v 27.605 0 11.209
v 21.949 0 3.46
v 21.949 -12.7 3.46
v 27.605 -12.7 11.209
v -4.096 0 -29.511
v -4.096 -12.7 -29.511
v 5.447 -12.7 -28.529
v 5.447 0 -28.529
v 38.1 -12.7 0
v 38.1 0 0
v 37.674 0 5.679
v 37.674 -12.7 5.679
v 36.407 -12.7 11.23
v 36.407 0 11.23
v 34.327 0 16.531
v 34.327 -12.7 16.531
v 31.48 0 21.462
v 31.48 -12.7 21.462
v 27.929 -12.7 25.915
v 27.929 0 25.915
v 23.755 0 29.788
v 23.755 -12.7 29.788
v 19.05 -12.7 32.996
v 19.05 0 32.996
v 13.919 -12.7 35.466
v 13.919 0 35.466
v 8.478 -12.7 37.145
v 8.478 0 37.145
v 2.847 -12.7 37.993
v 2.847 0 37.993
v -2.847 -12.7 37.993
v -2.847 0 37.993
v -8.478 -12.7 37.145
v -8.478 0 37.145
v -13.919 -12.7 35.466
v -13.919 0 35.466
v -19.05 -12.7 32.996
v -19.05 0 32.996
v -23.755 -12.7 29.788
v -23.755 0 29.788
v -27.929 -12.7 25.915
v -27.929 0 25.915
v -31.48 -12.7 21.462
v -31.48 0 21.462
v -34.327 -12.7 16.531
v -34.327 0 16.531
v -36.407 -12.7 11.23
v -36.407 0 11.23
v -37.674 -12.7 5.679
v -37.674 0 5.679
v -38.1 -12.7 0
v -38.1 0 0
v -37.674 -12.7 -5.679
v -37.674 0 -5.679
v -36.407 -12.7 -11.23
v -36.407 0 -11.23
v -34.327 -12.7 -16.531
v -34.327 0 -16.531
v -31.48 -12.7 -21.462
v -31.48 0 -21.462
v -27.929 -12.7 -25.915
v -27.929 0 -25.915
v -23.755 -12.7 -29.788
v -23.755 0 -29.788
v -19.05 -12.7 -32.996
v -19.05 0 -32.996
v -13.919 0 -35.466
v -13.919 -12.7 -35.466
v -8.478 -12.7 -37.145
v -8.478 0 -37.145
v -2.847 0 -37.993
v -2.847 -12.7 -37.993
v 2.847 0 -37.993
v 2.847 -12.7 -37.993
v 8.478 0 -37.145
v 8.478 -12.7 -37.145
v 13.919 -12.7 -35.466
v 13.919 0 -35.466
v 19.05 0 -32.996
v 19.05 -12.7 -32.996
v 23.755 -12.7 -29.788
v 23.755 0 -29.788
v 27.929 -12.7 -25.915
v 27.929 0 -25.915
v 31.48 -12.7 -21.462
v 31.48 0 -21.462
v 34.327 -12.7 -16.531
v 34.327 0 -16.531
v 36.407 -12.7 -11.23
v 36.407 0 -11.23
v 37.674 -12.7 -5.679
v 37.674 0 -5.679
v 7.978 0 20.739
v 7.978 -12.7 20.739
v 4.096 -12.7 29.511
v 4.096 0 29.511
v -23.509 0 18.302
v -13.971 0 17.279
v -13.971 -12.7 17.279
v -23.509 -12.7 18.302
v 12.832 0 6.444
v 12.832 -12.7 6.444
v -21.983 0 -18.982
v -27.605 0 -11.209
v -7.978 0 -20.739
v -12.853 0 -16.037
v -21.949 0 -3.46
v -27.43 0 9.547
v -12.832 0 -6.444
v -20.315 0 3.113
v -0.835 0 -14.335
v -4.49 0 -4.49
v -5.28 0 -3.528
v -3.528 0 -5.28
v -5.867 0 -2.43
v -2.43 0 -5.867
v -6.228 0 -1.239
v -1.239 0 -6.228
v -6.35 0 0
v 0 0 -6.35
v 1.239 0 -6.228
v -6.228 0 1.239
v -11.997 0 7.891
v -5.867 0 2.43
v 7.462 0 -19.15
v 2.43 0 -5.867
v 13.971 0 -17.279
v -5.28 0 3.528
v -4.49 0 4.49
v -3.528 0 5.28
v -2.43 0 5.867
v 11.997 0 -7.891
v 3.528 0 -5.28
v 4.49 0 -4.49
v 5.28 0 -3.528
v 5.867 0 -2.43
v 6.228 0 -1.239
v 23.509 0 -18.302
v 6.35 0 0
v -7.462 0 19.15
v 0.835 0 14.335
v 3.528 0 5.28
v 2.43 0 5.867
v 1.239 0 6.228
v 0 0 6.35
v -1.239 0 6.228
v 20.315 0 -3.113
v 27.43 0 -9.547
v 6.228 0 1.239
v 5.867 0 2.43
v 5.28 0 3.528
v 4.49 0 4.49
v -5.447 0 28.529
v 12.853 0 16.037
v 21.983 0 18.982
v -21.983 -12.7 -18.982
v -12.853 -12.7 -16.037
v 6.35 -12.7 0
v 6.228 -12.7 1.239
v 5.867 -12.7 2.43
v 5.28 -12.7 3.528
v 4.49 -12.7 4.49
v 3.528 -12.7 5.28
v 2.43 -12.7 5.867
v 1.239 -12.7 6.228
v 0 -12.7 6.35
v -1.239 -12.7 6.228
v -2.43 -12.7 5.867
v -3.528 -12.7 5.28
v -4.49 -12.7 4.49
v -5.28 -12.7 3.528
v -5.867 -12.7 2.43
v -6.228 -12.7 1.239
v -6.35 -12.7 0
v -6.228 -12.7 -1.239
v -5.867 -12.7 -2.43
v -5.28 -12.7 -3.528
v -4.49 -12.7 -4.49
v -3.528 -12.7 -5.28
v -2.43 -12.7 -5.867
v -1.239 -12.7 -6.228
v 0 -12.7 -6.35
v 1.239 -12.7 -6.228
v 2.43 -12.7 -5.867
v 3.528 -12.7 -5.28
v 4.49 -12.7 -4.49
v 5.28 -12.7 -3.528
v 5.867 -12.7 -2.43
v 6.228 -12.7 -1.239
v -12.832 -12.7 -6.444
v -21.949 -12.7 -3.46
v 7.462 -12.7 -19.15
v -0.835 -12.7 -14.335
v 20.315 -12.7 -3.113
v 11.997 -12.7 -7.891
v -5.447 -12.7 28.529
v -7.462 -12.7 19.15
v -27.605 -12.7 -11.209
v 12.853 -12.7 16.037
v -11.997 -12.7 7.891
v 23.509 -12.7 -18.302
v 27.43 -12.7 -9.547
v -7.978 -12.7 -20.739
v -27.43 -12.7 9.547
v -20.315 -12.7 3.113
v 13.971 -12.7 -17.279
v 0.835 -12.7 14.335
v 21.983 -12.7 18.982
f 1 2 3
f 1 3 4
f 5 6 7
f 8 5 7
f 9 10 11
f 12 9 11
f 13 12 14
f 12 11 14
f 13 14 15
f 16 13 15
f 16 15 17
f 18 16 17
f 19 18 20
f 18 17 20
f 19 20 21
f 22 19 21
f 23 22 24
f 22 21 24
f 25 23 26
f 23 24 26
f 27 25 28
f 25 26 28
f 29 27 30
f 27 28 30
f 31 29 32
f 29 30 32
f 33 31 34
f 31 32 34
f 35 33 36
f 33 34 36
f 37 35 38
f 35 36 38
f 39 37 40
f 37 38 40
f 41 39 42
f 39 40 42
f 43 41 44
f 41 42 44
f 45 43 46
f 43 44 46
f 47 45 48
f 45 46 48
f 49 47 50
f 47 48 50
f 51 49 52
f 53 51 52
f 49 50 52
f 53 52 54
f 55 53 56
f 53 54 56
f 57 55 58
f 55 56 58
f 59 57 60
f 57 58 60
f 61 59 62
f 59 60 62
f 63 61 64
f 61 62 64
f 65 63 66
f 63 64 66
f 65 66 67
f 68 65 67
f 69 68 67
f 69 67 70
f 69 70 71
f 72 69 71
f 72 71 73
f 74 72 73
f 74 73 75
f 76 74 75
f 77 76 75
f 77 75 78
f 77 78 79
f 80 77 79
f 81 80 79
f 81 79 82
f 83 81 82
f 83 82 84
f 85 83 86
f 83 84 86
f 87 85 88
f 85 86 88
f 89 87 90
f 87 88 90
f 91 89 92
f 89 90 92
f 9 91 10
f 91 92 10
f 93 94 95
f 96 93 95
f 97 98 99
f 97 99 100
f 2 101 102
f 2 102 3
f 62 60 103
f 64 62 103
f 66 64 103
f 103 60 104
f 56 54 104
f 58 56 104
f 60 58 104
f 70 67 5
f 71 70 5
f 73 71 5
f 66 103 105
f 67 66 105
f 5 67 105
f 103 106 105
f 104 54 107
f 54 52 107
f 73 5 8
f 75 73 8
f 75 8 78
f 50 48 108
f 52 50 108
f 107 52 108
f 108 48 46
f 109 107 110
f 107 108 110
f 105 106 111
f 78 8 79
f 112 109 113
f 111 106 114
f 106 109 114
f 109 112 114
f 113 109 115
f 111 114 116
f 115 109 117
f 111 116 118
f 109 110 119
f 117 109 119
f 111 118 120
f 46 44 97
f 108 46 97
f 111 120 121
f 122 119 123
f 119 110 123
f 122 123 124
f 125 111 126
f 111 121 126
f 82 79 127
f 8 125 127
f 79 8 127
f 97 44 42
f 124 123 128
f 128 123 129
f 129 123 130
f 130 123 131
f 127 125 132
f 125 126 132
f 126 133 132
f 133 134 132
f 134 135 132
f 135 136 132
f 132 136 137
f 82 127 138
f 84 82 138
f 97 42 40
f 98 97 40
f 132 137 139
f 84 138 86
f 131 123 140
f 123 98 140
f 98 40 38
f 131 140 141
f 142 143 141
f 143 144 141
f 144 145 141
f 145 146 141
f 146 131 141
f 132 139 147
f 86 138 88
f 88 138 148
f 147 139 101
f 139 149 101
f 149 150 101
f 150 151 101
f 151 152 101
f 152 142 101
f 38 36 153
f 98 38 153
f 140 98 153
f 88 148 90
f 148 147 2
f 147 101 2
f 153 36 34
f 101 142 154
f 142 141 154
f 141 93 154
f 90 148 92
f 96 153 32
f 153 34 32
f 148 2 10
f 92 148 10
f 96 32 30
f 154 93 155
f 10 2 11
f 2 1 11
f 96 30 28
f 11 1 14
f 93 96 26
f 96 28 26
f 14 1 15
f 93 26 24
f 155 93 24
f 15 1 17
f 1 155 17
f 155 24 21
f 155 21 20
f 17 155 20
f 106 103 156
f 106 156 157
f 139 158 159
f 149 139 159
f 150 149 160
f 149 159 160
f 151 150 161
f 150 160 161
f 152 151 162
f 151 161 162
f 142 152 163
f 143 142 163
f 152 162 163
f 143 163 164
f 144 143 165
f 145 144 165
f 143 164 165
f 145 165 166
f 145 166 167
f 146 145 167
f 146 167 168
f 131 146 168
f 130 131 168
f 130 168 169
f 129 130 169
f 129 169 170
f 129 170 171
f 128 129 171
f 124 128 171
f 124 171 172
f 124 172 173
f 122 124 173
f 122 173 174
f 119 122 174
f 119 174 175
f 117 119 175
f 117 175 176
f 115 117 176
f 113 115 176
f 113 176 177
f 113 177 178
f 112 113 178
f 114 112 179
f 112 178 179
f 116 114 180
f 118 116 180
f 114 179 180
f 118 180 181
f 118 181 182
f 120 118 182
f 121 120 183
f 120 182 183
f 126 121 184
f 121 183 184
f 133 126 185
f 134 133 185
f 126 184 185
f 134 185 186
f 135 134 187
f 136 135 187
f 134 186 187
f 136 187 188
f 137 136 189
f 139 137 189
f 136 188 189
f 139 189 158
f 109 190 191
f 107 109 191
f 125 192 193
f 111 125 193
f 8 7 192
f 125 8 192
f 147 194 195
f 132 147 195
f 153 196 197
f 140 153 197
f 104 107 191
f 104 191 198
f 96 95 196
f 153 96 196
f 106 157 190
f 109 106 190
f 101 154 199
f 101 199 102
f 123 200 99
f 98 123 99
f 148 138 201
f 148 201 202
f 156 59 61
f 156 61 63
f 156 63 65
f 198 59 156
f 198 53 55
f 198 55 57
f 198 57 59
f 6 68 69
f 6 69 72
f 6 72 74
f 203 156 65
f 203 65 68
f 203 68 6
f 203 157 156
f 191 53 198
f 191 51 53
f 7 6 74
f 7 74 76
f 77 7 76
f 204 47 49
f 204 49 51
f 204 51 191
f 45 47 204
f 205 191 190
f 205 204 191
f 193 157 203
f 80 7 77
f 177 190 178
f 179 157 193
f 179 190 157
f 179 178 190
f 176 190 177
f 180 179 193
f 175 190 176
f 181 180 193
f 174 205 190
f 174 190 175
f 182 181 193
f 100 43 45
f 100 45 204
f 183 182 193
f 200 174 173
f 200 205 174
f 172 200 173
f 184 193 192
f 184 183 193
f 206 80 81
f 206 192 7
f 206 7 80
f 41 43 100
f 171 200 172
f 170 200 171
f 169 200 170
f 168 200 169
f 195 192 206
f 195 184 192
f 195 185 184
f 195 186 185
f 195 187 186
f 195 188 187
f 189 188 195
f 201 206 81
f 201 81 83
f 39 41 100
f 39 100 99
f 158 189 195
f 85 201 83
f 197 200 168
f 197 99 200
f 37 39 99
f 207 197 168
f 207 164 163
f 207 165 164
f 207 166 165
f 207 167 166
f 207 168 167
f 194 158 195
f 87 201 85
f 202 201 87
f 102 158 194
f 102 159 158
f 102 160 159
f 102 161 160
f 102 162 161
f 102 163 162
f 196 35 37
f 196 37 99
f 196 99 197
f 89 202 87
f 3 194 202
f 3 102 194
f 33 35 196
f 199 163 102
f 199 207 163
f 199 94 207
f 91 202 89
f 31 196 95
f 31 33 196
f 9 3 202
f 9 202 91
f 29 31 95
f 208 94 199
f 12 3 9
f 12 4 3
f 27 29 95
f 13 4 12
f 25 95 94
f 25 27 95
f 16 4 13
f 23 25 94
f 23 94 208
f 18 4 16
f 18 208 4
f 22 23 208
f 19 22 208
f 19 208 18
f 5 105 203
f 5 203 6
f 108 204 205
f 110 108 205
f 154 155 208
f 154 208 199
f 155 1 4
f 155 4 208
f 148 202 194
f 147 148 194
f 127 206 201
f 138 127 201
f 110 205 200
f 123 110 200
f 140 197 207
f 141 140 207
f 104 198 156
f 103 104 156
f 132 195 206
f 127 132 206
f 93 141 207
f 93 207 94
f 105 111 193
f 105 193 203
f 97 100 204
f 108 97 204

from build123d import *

# Parameters (mm, degrees)
F0_R            = 38.1
F1_DEPTH        = 12.7
F2_R            = 6.35
F3_DEPTH        = 12.701
F5_DEPTH        = 12.701
F5_COPIES_COUNT = 6


# Not quite as in the source:
# - a pattern or mirror of a feature is missing from the dataset's text; its kind, count and spacing are read off the source's solid


with BuildPart() as f1:
    # F0 (on Front) → F1 (new body)
    with BuildSketch(Plane.XZ):
        Circle(F0_R)
    extrude(amount=F1_DEPTH)

    # F2 (on face) → F3 (cut, through all)
    with BuildSketch(Plane.XZ.offset(12.7)):
        Circle(F2_R)
    extrude(amount=-F3_DEPTH, mode=Mode.SUBTRACT)

    # F4 (on face) → F5 (cut, through all)
    with BuildSketch(Plane.XZ.offset(12.7)):
        Polygon((0.8353452235, 14.3352959198), (7.9783069864, 20.7387890774), (4.0955196667, 29.5109376166), (-5.4471366308, 28.5289304107), (-7.4620352459, 19.149868041), align=None)
    f5 = extrude(amount=-F5_DEPTH, mode=Mode.SUBTRACT)

    # F5_copies: F5 ×6 about axis
    f5_copies_axis = Axis((0, 0, 0), (0, 1, 0))
    for i in range(1, F5_COPIES_COUNT):
        add(f5.rotate(f5_copies_axis, i * 360 / F5_COPIES_COUNT), mode=Mode.SUBTRACT)


solid = f1.part
